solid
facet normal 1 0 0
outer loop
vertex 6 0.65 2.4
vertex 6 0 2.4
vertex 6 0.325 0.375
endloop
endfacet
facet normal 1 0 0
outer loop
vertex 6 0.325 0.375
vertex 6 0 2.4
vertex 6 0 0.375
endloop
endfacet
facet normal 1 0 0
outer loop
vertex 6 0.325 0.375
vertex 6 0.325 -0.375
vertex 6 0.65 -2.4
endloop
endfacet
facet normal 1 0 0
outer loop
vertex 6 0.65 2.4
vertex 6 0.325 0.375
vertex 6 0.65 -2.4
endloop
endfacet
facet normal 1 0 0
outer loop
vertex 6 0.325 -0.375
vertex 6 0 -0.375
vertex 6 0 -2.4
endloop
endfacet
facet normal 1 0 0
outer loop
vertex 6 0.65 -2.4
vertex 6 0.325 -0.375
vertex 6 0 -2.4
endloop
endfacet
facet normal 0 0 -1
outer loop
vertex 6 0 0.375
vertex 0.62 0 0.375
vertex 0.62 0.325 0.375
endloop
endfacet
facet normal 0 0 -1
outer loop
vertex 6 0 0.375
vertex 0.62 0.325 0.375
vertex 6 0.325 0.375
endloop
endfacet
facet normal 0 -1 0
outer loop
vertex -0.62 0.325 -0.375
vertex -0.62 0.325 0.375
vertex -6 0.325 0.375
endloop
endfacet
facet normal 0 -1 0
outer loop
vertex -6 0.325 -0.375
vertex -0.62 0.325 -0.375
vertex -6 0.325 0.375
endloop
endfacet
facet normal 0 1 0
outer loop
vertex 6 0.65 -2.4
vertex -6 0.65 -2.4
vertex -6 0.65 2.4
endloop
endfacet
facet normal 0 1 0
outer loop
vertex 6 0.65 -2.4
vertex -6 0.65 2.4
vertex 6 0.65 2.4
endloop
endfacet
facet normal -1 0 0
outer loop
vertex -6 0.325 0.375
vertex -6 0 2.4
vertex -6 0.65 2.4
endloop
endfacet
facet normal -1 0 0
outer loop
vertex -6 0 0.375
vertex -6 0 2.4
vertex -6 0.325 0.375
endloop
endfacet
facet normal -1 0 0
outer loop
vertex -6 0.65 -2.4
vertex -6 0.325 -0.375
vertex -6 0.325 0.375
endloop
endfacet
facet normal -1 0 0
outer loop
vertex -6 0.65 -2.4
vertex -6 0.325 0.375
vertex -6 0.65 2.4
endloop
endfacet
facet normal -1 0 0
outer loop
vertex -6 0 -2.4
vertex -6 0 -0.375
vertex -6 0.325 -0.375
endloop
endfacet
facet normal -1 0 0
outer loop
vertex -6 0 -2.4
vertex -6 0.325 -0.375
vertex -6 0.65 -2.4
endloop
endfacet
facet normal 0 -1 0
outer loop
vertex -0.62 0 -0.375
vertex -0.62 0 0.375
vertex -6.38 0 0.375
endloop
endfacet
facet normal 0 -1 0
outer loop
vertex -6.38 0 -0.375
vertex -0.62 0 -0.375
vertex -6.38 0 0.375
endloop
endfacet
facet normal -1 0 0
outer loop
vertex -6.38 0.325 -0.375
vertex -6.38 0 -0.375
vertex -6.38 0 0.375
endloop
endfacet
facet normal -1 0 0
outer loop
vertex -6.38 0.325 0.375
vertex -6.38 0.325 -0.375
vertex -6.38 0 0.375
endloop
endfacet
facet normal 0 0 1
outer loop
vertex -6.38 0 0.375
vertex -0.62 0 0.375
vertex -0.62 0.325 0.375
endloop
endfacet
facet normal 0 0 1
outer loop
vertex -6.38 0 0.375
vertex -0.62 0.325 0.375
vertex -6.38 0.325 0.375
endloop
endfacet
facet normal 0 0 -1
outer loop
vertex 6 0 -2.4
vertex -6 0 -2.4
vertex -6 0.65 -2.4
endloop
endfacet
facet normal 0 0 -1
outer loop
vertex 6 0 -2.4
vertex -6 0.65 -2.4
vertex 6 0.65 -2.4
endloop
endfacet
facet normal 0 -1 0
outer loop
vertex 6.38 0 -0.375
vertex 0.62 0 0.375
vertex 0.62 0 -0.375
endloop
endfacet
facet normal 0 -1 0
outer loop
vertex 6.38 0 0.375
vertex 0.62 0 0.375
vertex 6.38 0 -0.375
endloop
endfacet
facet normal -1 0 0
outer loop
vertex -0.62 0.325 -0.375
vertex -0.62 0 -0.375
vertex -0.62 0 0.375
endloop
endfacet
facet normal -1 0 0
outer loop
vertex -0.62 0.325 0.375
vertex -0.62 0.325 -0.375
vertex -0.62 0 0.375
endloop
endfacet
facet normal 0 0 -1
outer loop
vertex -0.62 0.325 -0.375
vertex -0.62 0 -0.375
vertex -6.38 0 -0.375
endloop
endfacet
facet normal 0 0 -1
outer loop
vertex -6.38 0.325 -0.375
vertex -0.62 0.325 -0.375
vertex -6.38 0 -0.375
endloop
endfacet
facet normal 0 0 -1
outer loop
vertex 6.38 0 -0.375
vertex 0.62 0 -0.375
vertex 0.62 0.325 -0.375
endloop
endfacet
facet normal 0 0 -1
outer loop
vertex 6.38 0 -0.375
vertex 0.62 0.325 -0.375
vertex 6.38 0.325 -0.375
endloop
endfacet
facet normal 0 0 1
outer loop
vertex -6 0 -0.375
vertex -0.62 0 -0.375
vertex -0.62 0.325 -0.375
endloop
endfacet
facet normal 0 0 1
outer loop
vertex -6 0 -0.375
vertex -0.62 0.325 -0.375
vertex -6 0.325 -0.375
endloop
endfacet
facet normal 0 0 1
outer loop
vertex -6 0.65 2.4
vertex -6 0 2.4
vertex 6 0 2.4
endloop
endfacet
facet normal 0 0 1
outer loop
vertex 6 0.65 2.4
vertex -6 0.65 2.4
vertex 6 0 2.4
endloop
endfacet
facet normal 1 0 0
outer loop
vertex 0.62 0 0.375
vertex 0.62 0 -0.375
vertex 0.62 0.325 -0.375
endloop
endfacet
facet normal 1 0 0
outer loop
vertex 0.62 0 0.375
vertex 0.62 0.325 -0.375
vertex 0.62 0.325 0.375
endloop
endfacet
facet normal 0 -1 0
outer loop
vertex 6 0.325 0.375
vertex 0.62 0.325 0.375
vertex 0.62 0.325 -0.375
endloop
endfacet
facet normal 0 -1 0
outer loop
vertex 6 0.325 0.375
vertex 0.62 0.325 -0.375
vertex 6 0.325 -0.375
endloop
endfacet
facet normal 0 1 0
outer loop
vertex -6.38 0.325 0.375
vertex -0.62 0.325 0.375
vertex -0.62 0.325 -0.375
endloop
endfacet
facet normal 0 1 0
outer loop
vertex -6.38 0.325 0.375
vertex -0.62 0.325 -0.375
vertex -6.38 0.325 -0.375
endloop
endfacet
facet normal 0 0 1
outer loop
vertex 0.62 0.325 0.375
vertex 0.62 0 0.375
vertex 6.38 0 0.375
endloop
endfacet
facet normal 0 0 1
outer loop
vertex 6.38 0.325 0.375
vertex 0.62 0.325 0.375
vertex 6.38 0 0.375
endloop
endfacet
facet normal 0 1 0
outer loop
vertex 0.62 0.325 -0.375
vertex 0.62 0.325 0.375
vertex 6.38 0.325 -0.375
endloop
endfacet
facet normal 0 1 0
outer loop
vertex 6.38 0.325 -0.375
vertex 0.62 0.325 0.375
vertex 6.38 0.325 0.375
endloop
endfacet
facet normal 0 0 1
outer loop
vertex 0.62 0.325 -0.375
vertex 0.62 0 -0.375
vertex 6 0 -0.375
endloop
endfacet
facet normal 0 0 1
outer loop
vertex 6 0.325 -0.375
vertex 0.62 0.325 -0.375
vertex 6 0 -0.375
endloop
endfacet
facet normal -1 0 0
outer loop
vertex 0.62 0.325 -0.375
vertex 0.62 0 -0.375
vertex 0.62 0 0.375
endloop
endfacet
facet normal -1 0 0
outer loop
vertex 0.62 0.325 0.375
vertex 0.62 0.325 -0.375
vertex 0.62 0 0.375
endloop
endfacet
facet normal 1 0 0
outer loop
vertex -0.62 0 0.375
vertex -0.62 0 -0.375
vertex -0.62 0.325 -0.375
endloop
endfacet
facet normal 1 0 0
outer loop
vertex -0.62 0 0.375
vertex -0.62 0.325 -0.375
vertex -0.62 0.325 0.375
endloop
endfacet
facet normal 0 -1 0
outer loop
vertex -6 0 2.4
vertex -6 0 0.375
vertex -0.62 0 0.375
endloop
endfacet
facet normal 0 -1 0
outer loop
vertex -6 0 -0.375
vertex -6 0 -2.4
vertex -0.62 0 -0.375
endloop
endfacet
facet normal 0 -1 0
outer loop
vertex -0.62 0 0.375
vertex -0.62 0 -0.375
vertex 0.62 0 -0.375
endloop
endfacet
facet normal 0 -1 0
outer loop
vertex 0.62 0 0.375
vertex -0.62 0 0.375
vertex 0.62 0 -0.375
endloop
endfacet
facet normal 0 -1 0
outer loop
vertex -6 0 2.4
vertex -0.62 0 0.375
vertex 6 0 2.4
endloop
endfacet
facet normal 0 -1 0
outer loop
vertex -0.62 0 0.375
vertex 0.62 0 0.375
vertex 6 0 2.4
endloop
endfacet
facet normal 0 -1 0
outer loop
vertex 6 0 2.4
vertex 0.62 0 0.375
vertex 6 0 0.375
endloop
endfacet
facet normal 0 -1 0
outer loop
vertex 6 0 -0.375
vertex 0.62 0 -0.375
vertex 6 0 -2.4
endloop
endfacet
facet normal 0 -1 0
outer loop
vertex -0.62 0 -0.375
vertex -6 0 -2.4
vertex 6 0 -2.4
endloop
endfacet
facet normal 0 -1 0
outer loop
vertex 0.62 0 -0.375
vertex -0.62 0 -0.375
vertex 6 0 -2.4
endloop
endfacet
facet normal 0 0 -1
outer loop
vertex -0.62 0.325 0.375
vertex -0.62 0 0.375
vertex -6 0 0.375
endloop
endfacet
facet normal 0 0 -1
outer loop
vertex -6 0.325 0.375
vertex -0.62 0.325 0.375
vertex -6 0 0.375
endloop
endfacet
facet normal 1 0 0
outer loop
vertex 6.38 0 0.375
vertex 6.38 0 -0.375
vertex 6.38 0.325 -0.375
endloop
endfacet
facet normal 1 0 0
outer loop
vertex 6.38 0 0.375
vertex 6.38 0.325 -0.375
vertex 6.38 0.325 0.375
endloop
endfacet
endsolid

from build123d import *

# Parameters (mm, degrees)
SKETCH1_W           = 12
SKETCH1_H           = 4.8
BOSS_EXTRUDE1_DEPTH = 0.65
SKETCH2_W           = 5.76
SKETCH2_H           = 0.75
BOSS_EXTRUDE2_DEPTH = 0.325
SKETCH2_2_W         = 5.76
SKETCH2_2_H         = 0.75
CUT_EXTRUDE1_DEPTH  = 0.325


with BuildPart() as part:
    # Sketch1 → Boss-Extrude1 (new body)
    with BuildSketch(Plane(origin=(0, 0, 0), x_dir=(1, 0, 0), z_dir=(0, 1, 0))):
        Rectangle(SKETCH1_W, SKETCH1_H)
    extrude(amount=BOSS_EXTRUDE1_DEPTH)

    # Sketch2<2> → Cut-Extrude1 (cut)
    with BuildSketch(Plane(origin=(0, 0, 0), x_dir=(-1, 0, 0), z_dir=(0, 1, 0))):
        with Locations((3.5, 0)):
            Rectangle(SKETCH2_2_W, SKETCH2_2_H)
    cut_extrude1 = extrude(amount=CUT_EXTRUDE1_DEPTH, mode=Mode.SUBTRACT)

    # Mirror2: Cut-Extrude1 across plane
    add(cut_extrude1.mirror(Plane(origin=(0, 0, 0), x_dir=(0, 0, 1), z_dir=(1, 0, 0))), mode=Mode.SUBTRACT)


with BuildPart() as body_2:
    # Sketch2 → Boss-Extrude2 (new body)
    with BuildSketch(Plane(origin=(0, 0, 0), x_dir=(-1, 0, 0), z_dir=(0, 1, 0))):
        with Locations((3.5, 0)):
            Rectangle(SKETCH2_W, SKETCH2_H)
    extrude(amount=BOSS_EXTRUDE2_DEPTH)


with BuildPart() as body_3:
    # Mirror1: mirrored copy
    add(body_2.part.mirror(Plane(origin=(0, 0, 0), x_dir=(0, 0, 1), z_dir=(1, 0, 0))))


solid = Compound([part.part, body_2.part, body_3.part])
